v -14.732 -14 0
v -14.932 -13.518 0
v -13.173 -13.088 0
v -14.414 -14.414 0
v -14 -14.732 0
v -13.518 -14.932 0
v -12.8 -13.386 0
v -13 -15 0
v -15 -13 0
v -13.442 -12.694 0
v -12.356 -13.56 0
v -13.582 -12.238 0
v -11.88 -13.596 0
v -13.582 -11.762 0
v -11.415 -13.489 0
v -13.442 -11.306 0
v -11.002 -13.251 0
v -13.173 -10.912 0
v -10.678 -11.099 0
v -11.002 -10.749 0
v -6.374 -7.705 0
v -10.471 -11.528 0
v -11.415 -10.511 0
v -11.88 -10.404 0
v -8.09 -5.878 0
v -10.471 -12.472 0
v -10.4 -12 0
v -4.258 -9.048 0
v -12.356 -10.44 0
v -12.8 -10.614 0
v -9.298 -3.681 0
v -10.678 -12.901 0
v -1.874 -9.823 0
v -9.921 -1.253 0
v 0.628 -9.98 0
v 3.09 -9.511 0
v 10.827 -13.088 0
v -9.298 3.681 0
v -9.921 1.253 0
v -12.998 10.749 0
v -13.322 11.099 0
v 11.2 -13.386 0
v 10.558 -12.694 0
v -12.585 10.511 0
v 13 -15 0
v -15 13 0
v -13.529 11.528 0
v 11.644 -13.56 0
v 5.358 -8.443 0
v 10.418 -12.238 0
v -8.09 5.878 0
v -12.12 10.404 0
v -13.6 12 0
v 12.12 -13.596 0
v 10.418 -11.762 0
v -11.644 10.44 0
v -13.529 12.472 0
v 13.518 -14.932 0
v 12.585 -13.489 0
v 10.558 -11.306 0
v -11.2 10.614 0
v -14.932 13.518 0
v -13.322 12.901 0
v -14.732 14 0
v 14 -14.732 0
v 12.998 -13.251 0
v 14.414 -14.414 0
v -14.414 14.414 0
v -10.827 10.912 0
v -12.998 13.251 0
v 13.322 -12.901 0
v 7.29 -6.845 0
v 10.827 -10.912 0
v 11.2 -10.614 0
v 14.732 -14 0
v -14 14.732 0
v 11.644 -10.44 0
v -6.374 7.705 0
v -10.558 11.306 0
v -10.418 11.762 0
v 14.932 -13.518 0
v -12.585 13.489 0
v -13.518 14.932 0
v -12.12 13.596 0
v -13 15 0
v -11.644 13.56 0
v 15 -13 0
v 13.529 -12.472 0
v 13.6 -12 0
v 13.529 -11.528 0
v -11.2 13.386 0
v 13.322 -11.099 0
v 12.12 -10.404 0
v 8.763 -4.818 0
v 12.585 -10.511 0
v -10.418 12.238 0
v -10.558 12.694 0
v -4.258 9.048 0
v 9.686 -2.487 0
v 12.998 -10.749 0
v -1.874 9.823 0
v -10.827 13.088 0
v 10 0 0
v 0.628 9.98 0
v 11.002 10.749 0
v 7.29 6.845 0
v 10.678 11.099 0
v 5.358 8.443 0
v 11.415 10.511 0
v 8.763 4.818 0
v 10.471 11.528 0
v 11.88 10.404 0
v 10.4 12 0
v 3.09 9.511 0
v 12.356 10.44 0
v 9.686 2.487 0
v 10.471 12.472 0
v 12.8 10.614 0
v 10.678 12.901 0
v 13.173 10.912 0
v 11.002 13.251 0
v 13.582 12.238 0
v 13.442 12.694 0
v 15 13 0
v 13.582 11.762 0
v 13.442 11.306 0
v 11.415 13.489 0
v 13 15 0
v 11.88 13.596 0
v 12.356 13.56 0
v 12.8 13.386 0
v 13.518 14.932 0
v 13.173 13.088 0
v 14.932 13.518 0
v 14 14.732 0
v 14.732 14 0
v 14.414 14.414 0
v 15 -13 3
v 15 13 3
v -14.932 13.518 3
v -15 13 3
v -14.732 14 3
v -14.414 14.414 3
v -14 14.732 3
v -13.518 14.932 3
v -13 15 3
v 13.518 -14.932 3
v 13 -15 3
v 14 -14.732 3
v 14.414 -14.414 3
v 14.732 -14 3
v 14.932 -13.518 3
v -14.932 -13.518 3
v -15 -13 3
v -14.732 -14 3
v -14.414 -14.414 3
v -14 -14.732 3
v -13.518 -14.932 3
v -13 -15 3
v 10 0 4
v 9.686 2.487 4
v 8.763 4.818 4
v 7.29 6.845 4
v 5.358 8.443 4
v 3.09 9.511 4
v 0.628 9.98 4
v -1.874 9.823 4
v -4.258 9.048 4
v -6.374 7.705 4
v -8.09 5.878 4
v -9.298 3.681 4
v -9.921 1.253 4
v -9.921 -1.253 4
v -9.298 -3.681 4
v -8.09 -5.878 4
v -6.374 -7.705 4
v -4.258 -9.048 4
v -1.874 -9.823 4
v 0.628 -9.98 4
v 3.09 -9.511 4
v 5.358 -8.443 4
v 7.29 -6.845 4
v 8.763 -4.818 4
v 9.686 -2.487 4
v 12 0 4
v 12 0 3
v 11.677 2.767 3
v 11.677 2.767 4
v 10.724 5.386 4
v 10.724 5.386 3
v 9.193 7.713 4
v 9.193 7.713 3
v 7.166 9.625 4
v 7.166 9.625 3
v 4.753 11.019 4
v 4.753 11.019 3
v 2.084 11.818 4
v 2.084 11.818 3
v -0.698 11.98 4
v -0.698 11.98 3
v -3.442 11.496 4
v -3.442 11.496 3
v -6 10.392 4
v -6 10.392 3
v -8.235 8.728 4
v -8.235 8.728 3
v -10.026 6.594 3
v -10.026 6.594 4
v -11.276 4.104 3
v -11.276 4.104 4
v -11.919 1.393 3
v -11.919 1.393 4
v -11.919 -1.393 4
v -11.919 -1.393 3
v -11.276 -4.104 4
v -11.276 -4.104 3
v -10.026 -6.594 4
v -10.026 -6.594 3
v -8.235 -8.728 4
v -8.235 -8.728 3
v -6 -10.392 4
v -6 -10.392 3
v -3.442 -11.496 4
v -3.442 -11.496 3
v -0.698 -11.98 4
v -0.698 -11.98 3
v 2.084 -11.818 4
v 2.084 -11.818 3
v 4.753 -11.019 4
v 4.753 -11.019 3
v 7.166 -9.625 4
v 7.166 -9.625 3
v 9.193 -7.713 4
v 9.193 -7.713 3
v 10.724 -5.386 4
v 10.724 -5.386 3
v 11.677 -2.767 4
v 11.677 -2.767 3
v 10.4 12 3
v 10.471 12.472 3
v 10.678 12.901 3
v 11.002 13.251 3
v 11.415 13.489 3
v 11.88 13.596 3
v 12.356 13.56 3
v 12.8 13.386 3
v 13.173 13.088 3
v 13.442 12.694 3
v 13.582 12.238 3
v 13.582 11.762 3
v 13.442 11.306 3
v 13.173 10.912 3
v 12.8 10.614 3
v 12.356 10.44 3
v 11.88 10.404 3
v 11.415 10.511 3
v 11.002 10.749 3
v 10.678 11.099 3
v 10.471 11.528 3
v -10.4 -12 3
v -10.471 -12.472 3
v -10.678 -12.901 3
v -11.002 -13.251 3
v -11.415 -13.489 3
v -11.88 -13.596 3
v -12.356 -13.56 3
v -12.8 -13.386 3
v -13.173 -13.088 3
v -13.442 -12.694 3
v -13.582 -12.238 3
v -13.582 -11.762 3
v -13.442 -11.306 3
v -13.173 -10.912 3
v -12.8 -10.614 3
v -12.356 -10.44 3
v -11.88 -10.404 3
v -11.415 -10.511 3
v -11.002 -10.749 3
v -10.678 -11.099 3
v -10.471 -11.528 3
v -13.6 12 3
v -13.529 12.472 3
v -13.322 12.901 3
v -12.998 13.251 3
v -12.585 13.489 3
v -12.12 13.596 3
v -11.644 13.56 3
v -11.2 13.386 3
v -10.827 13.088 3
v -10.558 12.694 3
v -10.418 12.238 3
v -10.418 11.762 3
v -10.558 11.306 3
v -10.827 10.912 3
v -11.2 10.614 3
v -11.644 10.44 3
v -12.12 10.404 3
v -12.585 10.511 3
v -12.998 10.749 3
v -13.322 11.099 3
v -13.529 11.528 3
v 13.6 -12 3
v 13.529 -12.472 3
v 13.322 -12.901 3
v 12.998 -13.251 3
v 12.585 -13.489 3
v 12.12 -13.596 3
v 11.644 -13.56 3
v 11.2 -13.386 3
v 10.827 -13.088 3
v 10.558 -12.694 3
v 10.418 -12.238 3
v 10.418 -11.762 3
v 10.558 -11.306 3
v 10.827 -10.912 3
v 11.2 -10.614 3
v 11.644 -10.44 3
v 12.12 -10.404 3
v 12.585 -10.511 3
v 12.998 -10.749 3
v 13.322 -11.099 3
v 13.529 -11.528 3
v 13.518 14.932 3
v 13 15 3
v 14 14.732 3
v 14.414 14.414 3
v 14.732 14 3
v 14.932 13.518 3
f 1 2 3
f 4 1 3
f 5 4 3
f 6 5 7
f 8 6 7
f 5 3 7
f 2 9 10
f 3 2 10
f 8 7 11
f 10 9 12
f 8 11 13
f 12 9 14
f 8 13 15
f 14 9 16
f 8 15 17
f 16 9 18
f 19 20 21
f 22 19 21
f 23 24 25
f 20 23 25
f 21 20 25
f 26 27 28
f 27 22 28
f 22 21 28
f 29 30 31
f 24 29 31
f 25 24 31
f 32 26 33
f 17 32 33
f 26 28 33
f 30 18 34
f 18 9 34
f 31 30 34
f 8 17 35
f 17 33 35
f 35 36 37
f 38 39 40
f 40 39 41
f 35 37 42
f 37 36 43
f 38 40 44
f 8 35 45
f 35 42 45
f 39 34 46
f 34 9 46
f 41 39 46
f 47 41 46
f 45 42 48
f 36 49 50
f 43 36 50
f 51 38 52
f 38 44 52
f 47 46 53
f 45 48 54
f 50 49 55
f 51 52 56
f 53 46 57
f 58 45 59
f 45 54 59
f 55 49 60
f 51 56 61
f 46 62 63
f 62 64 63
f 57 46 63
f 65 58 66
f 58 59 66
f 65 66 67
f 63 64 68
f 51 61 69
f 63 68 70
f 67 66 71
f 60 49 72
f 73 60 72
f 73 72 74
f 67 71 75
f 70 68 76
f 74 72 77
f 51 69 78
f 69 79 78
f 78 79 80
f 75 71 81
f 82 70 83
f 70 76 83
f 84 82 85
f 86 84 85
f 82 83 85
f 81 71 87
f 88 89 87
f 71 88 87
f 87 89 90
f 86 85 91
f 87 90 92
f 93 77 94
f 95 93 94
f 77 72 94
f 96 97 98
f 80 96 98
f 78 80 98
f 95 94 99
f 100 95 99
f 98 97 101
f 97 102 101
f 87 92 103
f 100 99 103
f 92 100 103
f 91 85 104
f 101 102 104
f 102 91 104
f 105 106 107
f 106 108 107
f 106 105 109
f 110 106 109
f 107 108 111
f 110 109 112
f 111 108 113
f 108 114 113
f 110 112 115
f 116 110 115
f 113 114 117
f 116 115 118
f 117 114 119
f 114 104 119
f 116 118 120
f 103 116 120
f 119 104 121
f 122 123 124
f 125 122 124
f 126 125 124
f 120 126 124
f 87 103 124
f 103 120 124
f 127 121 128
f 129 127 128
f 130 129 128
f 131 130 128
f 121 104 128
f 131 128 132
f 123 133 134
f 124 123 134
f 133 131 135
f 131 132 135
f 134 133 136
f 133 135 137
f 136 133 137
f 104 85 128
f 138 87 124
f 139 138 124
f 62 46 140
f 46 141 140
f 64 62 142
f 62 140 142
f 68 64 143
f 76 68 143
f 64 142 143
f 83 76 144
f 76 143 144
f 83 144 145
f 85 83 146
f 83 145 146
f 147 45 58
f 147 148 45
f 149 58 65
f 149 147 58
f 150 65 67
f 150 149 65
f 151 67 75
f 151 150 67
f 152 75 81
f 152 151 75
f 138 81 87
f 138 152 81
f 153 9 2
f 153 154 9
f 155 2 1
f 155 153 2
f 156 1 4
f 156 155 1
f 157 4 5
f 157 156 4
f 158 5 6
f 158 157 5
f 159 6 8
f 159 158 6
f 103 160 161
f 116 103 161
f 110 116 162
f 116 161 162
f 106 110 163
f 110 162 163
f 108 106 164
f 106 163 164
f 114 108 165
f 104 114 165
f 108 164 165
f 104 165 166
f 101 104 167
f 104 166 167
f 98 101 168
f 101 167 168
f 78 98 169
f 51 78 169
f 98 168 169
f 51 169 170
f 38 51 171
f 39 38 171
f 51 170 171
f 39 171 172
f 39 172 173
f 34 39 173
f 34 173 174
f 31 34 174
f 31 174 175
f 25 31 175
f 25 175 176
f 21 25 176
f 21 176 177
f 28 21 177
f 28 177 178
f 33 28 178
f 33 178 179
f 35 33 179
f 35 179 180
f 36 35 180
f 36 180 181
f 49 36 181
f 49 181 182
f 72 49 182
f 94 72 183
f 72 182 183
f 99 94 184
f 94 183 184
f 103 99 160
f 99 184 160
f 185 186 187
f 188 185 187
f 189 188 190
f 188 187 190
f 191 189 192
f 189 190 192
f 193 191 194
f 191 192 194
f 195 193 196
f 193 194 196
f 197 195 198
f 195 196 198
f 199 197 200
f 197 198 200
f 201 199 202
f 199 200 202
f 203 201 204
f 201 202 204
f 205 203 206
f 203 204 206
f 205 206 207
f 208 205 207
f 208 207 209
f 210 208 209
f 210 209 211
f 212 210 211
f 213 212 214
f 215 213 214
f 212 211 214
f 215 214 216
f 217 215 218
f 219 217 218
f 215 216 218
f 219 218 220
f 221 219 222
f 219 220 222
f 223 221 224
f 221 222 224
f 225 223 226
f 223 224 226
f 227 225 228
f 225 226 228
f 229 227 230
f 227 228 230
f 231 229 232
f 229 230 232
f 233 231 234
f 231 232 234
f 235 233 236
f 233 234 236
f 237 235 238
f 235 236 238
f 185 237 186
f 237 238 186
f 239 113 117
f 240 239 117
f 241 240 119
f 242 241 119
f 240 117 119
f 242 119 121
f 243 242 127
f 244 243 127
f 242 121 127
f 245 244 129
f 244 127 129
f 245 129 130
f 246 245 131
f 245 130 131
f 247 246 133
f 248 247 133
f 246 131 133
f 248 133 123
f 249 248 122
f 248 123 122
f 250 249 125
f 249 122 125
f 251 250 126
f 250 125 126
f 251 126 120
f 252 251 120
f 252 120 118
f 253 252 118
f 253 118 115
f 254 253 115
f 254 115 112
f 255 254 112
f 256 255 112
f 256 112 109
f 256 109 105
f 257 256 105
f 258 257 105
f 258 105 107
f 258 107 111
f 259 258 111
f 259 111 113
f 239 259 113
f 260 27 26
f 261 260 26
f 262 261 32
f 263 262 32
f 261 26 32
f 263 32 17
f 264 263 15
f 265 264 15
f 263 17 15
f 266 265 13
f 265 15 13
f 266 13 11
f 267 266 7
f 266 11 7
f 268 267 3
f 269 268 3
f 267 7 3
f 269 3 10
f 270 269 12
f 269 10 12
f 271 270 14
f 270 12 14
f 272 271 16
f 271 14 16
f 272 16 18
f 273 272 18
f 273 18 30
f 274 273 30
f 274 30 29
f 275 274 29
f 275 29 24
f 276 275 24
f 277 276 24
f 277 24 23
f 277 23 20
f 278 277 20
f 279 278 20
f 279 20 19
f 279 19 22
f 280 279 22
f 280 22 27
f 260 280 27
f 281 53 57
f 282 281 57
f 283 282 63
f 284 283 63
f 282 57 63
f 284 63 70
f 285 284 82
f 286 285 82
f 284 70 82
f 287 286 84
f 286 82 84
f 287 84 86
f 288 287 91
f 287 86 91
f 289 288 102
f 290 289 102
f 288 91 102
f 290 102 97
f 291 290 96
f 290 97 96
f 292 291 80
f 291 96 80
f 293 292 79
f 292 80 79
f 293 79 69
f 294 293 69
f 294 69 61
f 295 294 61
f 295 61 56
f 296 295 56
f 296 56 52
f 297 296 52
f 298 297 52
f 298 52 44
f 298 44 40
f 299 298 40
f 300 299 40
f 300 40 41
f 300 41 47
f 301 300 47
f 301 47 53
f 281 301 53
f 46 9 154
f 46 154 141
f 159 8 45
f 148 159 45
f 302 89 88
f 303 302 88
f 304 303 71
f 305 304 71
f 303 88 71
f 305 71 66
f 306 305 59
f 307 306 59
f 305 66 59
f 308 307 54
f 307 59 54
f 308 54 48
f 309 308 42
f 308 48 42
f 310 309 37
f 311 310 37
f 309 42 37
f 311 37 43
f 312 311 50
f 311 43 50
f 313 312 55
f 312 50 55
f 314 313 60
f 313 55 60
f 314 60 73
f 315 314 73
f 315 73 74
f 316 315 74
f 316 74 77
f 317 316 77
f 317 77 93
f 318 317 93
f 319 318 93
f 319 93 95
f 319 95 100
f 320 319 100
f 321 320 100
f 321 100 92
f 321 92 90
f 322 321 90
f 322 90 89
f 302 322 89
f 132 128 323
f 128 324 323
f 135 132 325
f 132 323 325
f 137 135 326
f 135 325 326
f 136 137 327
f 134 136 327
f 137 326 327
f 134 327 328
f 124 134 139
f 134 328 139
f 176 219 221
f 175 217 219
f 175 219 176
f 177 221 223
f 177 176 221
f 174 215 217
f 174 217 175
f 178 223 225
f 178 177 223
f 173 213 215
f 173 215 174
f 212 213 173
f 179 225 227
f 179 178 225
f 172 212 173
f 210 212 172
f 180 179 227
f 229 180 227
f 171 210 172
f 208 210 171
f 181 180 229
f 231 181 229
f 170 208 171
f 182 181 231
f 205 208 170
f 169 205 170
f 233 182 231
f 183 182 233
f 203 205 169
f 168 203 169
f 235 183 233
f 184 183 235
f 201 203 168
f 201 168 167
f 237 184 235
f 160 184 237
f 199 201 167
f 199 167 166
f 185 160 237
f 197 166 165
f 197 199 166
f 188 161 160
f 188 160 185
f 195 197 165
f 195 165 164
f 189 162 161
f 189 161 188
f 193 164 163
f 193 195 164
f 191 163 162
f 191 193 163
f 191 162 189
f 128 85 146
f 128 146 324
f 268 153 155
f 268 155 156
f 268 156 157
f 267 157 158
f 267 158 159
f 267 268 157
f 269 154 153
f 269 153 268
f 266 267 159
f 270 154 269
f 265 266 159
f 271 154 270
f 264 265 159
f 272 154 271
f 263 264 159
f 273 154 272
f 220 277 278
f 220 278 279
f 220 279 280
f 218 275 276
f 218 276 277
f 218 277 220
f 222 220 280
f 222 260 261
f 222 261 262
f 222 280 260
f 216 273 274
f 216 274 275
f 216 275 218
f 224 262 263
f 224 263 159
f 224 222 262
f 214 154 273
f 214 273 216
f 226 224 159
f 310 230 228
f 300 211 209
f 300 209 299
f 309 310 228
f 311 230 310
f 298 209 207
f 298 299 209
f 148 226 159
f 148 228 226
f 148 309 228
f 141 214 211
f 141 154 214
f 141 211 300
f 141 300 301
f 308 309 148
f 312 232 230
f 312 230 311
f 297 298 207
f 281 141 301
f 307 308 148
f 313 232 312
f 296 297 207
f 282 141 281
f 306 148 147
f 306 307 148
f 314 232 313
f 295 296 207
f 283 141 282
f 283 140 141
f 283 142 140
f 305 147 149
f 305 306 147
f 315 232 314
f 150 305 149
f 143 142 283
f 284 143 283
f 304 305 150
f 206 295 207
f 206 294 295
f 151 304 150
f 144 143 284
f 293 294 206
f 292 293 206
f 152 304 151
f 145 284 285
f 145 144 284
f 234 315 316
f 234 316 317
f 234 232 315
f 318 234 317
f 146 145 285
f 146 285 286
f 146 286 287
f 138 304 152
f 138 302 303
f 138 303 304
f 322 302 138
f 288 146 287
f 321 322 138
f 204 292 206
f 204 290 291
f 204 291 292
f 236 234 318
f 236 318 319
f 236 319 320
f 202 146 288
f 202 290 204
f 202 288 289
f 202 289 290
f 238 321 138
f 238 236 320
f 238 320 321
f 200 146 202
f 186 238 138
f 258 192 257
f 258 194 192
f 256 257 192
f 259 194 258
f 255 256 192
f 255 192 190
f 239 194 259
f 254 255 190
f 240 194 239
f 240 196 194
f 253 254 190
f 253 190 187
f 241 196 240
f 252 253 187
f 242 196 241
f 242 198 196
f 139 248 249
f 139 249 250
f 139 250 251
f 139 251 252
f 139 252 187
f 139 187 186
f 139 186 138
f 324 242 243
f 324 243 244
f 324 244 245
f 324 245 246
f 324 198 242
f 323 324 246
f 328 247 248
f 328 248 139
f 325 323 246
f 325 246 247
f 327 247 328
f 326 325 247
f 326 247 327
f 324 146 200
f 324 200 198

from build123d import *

# Parameters (mm, degrees)
SKETCH_1_W          = 30
SKETCH_1_H          = 30
EXTRUDE_1_DEPTH     = 3
SKETCH_2_R          = 12
EXTRUDE_2_DEPTH     = 1
SKETCH_3_R          = 10
CUT_EXTRUDE_2_DEPTH = 22.587033145
SKETCH_4_R          = 1.6
CUT_EXTRUDE_3_DEPTH = 22.587033145
FILLET_1_R          = 2


with BuildPart() as part:
    # 草图1 → 凸台-拉伸1 (new body)
    with BuildSketch(Plane.XY):
        Rectangle(SKETCH_1_W, SKETCH_1_H)
    extrude(amount=EXTRUDE_1_DEPTH)

    # 草图2 → 凸台-拉伸2 (add)
    with BuildSketch(Plane.XY.offset(3)):
        Circle(SKETCH_2_R)
    extrude(amount=EXTRUDE_2_DEPTH)

    # 草图3 → 切除-拉伸2 (cut, through all)
    with BuildSketch(Plane.XY.offset(4)):
        Circle(SKETCH_3_R)
    extrude(amount=-CUT_EXTRUDE_2_DEPTH, mode=Mode.SUBTRACT)

    # 草图4 → 切除-拉伸3 (cut, through all)
    with BuildSketch(Plane(origin=(0, 0, 0), x_dir=(-1, 0, 0), z_dir=(0, 0, -1))):
        with Locations((12, 12)):
            Circle(SKETCH_4_R)
        with Locations((-12, 12)):
            Circle(SKETCH_4_R)
        with Locations(Location((12, -12, 0), (0, 0, 180))):
            Circle(SKETCH_4_R)
        with Locations(Location((-12, -12, 0), (0, 0, 180))):
            Circle(SKETCH_4_R)
    extrude(amount=-CUT_EXTRUDE_3_DEPTH, mode=Mode.SUBTRACT)

    # 圆角1
    fillet_1_edges = [part.edges().sort_by_distance(p)[0] for p in [
        (-15, 15, 1.5),
        (15, 15, 1.5),
        (15, -15, 1.5),
        (-15, -15, 1.5),
    ]]
    fillet(fillet_1_edges, radius=FILLET_1_R)


solid = part.part
